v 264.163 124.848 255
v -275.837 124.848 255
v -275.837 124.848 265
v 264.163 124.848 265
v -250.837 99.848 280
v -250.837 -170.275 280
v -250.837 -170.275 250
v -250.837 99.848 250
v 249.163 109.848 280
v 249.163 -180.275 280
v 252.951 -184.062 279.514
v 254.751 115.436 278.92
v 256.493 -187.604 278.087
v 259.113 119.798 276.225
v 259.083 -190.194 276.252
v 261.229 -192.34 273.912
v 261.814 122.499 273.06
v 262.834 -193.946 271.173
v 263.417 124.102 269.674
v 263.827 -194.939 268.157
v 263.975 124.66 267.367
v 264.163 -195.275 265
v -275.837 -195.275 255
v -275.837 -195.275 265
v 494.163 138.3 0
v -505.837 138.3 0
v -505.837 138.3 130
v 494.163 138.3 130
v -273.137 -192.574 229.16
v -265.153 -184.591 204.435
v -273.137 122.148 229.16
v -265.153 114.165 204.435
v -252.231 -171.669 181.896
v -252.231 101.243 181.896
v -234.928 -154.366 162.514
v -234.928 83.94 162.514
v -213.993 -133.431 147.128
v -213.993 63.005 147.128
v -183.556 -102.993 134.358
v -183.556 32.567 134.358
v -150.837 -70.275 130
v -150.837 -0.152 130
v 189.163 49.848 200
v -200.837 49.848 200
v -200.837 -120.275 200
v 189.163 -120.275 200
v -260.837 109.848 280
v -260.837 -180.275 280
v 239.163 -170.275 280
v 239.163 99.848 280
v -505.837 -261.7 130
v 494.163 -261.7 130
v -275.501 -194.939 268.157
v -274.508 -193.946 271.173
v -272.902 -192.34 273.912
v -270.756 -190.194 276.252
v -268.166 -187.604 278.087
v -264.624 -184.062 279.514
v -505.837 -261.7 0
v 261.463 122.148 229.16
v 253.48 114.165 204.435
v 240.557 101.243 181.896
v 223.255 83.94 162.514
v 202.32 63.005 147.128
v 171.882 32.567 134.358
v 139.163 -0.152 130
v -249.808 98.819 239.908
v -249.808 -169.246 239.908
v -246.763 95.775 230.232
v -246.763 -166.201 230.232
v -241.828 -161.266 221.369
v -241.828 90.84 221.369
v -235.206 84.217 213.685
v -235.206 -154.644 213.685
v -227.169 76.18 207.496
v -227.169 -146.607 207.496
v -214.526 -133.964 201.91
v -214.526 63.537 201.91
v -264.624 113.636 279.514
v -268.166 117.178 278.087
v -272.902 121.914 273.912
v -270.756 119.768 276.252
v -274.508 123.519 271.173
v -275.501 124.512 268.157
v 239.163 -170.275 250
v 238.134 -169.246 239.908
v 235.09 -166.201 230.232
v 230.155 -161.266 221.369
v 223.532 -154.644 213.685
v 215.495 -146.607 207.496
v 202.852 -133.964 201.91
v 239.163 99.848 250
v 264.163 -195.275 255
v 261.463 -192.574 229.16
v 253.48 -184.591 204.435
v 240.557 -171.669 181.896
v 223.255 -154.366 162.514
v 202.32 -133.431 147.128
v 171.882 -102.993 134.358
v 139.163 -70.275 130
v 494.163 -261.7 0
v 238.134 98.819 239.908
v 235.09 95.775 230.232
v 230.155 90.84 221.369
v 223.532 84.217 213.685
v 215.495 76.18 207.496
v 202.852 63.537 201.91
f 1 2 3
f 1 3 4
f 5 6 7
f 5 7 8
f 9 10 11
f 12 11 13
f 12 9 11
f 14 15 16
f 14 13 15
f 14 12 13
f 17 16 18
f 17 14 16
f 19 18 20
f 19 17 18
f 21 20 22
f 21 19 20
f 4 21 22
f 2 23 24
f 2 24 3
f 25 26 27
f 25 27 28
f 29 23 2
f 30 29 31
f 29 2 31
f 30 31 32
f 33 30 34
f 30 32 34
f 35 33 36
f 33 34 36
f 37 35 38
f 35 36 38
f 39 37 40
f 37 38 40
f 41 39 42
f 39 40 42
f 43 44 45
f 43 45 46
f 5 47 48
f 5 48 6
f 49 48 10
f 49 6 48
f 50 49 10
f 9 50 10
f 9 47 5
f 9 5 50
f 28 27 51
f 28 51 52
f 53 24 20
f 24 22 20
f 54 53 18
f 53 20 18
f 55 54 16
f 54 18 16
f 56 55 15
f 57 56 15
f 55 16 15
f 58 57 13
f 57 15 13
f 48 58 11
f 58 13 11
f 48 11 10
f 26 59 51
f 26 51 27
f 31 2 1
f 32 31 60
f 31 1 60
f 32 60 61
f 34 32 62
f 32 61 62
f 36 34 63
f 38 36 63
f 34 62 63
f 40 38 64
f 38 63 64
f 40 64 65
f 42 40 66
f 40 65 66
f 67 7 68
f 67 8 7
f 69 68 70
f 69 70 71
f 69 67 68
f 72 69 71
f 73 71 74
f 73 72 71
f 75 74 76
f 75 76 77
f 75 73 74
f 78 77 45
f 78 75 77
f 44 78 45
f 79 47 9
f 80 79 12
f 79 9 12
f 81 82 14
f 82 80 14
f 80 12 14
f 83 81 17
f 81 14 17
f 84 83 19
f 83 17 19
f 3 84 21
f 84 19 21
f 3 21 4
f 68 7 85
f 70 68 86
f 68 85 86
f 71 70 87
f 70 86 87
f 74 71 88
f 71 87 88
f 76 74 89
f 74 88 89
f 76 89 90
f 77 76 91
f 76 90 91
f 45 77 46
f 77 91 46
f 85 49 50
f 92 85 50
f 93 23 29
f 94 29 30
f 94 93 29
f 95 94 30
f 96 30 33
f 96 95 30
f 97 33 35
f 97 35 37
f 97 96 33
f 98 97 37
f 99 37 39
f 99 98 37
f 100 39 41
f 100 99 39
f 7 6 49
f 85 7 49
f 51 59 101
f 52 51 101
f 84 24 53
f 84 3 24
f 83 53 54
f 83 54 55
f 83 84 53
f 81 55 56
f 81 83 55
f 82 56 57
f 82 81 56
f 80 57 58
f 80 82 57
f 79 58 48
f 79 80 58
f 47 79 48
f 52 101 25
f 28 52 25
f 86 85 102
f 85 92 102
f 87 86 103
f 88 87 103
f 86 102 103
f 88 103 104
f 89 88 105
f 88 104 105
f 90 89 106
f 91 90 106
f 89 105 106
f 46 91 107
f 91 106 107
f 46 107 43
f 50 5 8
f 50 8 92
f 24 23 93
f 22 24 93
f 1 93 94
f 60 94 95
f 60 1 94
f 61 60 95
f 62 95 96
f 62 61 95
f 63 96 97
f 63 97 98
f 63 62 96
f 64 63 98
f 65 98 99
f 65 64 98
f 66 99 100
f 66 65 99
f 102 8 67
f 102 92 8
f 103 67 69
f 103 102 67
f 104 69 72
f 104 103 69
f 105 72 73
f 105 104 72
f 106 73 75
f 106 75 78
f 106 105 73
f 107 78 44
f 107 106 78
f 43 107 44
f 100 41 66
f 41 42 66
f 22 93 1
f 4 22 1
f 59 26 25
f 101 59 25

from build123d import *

# Parameters (mm, degrees)
F0_W     = 1000
F0_H     = 400
F1_DEPTH = 130
F3_W     = 540
F3_H     = 320.122876247
F4_DEPTH = 150
F5_R     = 125
F6_R     = 15
F7_W     = 490
F7_H     = 270.122876247
F8_DEPTH = 80
F9_R     = 50


with BuildPart() as f1:
    # F0 (on Top) → F1 (new body)
    with BuildSketch(Plane.XY):
        with Locations((-5.8366749436, -61.7000508067)):
            Rectangle(F0_W, F0_H)
    extrude(amount=F1_DEPTH)


with BuildPart() as f4:
    # F3 (on offset) → F4 (new body)
    with BuildSketch(Plane.XY.offset(130)):
        with Locations((-5.8366749436, -35.2130914107)):
            Rectangle(F3_W, F3_H)
    extrude(amount=F4_DEPTH)

    # F5
    f5_edges = [f4.edges().sort_by_distance(p)[0] for p in [
        (-5.836675, -195.27453, 130),
        (264.163325, -35.213091, 130),
        (-5.836675, 124.848347, 130),
        (-275.836675, -35.213091, 130),
    ]]
    fillet(f5_edges, radius=F5_R)

    # F6
    f6_edges = [f4.edges().sort_by_distance(p)[0] for p in [
        (-5.836675, -195.27453, 280),
        (-275.836675, -35.213091, 280),
        (-5.836675, 124.848347, 280),
        (264.163325, -35.213091, 280),
    ]]
    fillet(f6_edges, radius=F6_R)

    # F7 (on face) → F8 (cut)
    with BuildSketch(Plane.XY.offset(280)):
        with Locations((-5.8366749436, -35.2130914107)):
            Rectangle(F7_W, F7_H)
    extrude(amount=-F8_DEPTH, mode=Mode.SUBTRACT)

    # F9
    f9_edges = [f4.edges().sort_by_distance(p)[0] for p in [
        (-5.836675, 99.848347, 200),
        (-250.836675, -35.213091, 200),
        (239.163325, -35.213091, 200),
        (-5.836675, -170.27453, 200),
    ]]
    fillet(f9_edges, radius=F9_R)


solid = Compound([f1.part, f4.part])
